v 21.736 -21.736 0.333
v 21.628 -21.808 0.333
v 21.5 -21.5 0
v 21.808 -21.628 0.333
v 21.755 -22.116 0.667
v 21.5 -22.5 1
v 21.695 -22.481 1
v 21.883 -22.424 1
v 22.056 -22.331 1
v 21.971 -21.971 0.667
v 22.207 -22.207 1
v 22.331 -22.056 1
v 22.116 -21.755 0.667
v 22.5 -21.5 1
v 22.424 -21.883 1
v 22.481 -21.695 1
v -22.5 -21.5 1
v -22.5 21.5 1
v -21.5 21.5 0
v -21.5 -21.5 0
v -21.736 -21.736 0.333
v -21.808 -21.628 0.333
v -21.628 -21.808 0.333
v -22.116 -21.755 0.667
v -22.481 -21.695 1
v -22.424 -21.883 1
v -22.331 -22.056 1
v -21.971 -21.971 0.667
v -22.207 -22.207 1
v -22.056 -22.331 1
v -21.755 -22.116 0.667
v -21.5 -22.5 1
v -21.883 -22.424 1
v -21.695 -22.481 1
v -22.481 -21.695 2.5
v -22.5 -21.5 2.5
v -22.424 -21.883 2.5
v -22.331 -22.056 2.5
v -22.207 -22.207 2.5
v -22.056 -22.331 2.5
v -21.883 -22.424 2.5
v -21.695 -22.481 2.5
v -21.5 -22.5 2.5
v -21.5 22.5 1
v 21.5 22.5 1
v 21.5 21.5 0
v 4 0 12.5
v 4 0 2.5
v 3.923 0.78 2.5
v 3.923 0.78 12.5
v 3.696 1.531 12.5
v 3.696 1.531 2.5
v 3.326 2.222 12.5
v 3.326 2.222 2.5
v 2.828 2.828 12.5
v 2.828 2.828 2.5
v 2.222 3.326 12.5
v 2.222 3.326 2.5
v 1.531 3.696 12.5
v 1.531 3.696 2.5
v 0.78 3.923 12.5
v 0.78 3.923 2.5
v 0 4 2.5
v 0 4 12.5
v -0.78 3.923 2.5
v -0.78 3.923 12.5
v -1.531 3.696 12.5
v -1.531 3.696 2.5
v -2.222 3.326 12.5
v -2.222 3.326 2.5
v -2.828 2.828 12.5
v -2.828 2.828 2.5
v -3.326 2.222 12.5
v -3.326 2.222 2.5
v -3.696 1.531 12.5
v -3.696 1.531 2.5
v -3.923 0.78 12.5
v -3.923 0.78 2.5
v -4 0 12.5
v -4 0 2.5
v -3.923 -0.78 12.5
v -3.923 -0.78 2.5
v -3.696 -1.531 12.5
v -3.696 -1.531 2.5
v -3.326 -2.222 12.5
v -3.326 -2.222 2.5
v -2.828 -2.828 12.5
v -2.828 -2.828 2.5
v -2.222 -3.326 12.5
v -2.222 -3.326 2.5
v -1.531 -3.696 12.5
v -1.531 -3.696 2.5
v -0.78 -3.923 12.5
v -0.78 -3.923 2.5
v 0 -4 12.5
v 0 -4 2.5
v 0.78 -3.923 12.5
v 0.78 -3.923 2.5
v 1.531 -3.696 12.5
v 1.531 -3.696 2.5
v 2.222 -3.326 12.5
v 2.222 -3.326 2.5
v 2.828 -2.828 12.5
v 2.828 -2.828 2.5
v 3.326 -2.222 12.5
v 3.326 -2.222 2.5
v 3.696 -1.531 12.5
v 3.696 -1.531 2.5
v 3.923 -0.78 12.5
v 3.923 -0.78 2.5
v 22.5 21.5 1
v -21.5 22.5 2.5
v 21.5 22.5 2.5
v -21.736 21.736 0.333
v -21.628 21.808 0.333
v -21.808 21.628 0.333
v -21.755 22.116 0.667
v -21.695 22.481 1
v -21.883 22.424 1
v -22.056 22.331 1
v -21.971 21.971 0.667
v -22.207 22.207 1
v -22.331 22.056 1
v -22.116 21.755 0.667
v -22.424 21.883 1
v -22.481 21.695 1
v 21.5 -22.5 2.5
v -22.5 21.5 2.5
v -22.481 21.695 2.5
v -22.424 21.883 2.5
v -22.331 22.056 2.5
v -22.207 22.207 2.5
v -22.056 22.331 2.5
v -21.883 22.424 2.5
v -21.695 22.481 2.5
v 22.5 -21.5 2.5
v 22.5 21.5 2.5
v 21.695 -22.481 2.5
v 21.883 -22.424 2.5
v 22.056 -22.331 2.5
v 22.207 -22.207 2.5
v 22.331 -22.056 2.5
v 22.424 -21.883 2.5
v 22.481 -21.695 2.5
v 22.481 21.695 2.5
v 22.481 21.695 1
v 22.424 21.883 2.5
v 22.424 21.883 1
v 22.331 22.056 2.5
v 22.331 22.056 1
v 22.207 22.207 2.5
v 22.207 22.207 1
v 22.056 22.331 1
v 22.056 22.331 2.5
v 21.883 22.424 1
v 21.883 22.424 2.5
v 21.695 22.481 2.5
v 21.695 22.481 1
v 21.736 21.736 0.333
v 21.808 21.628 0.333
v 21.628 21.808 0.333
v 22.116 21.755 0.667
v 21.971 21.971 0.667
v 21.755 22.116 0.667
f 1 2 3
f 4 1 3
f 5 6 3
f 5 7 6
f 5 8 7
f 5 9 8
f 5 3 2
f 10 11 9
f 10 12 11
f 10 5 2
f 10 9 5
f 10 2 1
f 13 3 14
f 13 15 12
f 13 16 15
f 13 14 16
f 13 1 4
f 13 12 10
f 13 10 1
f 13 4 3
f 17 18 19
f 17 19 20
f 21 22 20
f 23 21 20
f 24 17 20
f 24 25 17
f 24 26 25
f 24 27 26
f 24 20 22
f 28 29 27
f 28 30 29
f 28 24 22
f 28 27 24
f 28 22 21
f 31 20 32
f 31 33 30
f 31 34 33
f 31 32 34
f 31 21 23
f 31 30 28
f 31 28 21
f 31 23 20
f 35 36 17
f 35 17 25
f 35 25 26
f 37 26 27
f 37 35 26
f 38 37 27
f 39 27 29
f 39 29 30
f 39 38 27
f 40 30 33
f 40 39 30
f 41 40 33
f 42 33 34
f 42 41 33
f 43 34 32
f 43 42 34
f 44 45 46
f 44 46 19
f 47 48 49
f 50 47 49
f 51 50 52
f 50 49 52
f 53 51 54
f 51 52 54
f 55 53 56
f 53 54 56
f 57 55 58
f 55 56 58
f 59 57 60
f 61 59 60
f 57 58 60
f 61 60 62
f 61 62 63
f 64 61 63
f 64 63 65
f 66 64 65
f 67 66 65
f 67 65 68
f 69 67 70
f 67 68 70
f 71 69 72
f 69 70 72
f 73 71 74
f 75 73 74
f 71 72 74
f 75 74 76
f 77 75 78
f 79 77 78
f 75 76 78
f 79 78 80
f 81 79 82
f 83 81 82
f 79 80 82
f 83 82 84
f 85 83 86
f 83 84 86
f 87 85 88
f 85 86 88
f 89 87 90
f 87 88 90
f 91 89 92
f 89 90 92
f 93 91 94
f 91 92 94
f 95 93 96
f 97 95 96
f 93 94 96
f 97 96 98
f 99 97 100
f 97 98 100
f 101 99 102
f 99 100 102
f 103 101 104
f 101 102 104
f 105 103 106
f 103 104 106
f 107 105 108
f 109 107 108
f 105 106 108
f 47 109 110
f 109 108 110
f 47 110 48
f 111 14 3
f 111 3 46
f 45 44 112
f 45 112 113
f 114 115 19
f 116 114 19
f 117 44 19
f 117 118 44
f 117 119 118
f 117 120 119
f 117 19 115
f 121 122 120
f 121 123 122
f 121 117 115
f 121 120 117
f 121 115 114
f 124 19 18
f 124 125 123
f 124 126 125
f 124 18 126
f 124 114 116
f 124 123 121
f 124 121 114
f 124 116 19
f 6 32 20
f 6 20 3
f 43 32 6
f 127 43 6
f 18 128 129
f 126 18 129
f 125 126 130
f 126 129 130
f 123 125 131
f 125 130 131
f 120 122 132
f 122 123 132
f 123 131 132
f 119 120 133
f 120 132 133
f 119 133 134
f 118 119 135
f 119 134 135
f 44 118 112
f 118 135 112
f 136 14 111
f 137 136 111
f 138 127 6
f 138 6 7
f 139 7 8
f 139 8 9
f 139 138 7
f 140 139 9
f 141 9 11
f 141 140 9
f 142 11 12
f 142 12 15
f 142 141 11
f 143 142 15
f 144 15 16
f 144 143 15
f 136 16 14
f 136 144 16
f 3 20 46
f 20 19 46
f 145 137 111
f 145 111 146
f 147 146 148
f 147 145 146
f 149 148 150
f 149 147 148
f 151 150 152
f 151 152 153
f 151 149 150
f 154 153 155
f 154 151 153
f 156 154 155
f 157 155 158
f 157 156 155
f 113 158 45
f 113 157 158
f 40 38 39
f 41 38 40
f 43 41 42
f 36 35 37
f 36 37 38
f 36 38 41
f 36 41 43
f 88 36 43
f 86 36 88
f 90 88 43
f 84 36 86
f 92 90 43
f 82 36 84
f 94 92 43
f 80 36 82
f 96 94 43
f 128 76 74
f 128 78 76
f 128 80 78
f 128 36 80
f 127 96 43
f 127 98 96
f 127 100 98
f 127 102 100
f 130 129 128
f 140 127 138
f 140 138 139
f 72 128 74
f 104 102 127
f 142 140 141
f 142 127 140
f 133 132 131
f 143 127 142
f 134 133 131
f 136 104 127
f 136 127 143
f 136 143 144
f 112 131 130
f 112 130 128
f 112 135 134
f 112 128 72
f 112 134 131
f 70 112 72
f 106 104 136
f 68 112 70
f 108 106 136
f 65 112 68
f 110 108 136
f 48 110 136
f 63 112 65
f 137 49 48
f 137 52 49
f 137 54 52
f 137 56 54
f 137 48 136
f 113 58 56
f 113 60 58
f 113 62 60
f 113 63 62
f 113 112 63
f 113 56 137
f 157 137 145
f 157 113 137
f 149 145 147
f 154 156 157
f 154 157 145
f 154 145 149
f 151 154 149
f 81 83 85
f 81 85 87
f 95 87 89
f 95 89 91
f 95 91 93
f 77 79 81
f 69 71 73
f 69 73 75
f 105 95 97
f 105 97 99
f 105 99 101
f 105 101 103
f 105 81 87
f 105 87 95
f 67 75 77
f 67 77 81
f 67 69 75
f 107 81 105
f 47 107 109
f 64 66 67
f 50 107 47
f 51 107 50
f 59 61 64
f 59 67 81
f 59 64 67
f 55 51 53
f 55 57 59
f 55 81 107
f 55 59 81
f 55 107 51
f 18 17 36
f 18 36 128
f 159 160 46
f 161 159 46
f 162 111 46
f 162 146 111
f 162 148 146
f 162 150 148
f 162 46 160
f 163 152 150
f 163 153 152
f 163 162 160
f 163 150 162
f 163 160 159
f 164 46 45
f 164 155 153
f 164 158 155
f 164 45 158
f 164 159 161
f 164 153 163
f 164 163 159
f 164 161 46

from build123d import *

# Parameters (mm, degrees)
SKETCH1_W           = 45
SKETCH1_H           = 45
BOSS_EXTRUDE1_DEPTH = 2.5
FILLET1_R           = 1
SKETCH2_R           = 4
BOSS_EXTRUDE2_DEPTH = 10
CHAMFER1_SIZE       = 1


with BuildPart() as part:
    # Sketch1 → Boss-Extrude1 (new body)
    with BuildSketch(Plane.XY):
        Rectangle(SKETCH1_W, SKETCH1_H)
    extrude(amount=BOSS_EXTRUDE1_DEPTH)

    # Fillet1
    fillet1_edges = [part.edges().sort_by_distance(p)[0] for p in [
        (-22.5, 22.5, 1.25),
        (22.5, 22.5, 1.25),
        (22.5, -22.5, 1.25),
        (-22.5, -22.5, 1.25),
    ]]
    fillet(fillet1_edges, radius=FILLET1_R)

    # Sketch2 → Boss-Extrude2 (add)
    with BuildSketch(Plane.XY.offset(2.5)):
        Circle(SKETCH2_R)
    extrude(amount=BOSS_EXTRUDE2_DEPTH)

    # Chamfer1
    chamfer1_edges = [part.edges().sort_by_distance(p)[0] for p in [
        (0, -22.5, 0),
        (-22.5, 0, 0),
        (0, 22.5, 0),
        (22.5, 0, 0),
        (22.207106781, 22.207106781, 0),
        (-22.207106781, 22.207106781, 0),
        (22.207106781, -22.207106781, 0),
        (-22.207106781, -22.207106781, 0),
    ]]
    chamfer(chamfer1_edges, length=CHAMFER1_SIZE)


solid = part.part
